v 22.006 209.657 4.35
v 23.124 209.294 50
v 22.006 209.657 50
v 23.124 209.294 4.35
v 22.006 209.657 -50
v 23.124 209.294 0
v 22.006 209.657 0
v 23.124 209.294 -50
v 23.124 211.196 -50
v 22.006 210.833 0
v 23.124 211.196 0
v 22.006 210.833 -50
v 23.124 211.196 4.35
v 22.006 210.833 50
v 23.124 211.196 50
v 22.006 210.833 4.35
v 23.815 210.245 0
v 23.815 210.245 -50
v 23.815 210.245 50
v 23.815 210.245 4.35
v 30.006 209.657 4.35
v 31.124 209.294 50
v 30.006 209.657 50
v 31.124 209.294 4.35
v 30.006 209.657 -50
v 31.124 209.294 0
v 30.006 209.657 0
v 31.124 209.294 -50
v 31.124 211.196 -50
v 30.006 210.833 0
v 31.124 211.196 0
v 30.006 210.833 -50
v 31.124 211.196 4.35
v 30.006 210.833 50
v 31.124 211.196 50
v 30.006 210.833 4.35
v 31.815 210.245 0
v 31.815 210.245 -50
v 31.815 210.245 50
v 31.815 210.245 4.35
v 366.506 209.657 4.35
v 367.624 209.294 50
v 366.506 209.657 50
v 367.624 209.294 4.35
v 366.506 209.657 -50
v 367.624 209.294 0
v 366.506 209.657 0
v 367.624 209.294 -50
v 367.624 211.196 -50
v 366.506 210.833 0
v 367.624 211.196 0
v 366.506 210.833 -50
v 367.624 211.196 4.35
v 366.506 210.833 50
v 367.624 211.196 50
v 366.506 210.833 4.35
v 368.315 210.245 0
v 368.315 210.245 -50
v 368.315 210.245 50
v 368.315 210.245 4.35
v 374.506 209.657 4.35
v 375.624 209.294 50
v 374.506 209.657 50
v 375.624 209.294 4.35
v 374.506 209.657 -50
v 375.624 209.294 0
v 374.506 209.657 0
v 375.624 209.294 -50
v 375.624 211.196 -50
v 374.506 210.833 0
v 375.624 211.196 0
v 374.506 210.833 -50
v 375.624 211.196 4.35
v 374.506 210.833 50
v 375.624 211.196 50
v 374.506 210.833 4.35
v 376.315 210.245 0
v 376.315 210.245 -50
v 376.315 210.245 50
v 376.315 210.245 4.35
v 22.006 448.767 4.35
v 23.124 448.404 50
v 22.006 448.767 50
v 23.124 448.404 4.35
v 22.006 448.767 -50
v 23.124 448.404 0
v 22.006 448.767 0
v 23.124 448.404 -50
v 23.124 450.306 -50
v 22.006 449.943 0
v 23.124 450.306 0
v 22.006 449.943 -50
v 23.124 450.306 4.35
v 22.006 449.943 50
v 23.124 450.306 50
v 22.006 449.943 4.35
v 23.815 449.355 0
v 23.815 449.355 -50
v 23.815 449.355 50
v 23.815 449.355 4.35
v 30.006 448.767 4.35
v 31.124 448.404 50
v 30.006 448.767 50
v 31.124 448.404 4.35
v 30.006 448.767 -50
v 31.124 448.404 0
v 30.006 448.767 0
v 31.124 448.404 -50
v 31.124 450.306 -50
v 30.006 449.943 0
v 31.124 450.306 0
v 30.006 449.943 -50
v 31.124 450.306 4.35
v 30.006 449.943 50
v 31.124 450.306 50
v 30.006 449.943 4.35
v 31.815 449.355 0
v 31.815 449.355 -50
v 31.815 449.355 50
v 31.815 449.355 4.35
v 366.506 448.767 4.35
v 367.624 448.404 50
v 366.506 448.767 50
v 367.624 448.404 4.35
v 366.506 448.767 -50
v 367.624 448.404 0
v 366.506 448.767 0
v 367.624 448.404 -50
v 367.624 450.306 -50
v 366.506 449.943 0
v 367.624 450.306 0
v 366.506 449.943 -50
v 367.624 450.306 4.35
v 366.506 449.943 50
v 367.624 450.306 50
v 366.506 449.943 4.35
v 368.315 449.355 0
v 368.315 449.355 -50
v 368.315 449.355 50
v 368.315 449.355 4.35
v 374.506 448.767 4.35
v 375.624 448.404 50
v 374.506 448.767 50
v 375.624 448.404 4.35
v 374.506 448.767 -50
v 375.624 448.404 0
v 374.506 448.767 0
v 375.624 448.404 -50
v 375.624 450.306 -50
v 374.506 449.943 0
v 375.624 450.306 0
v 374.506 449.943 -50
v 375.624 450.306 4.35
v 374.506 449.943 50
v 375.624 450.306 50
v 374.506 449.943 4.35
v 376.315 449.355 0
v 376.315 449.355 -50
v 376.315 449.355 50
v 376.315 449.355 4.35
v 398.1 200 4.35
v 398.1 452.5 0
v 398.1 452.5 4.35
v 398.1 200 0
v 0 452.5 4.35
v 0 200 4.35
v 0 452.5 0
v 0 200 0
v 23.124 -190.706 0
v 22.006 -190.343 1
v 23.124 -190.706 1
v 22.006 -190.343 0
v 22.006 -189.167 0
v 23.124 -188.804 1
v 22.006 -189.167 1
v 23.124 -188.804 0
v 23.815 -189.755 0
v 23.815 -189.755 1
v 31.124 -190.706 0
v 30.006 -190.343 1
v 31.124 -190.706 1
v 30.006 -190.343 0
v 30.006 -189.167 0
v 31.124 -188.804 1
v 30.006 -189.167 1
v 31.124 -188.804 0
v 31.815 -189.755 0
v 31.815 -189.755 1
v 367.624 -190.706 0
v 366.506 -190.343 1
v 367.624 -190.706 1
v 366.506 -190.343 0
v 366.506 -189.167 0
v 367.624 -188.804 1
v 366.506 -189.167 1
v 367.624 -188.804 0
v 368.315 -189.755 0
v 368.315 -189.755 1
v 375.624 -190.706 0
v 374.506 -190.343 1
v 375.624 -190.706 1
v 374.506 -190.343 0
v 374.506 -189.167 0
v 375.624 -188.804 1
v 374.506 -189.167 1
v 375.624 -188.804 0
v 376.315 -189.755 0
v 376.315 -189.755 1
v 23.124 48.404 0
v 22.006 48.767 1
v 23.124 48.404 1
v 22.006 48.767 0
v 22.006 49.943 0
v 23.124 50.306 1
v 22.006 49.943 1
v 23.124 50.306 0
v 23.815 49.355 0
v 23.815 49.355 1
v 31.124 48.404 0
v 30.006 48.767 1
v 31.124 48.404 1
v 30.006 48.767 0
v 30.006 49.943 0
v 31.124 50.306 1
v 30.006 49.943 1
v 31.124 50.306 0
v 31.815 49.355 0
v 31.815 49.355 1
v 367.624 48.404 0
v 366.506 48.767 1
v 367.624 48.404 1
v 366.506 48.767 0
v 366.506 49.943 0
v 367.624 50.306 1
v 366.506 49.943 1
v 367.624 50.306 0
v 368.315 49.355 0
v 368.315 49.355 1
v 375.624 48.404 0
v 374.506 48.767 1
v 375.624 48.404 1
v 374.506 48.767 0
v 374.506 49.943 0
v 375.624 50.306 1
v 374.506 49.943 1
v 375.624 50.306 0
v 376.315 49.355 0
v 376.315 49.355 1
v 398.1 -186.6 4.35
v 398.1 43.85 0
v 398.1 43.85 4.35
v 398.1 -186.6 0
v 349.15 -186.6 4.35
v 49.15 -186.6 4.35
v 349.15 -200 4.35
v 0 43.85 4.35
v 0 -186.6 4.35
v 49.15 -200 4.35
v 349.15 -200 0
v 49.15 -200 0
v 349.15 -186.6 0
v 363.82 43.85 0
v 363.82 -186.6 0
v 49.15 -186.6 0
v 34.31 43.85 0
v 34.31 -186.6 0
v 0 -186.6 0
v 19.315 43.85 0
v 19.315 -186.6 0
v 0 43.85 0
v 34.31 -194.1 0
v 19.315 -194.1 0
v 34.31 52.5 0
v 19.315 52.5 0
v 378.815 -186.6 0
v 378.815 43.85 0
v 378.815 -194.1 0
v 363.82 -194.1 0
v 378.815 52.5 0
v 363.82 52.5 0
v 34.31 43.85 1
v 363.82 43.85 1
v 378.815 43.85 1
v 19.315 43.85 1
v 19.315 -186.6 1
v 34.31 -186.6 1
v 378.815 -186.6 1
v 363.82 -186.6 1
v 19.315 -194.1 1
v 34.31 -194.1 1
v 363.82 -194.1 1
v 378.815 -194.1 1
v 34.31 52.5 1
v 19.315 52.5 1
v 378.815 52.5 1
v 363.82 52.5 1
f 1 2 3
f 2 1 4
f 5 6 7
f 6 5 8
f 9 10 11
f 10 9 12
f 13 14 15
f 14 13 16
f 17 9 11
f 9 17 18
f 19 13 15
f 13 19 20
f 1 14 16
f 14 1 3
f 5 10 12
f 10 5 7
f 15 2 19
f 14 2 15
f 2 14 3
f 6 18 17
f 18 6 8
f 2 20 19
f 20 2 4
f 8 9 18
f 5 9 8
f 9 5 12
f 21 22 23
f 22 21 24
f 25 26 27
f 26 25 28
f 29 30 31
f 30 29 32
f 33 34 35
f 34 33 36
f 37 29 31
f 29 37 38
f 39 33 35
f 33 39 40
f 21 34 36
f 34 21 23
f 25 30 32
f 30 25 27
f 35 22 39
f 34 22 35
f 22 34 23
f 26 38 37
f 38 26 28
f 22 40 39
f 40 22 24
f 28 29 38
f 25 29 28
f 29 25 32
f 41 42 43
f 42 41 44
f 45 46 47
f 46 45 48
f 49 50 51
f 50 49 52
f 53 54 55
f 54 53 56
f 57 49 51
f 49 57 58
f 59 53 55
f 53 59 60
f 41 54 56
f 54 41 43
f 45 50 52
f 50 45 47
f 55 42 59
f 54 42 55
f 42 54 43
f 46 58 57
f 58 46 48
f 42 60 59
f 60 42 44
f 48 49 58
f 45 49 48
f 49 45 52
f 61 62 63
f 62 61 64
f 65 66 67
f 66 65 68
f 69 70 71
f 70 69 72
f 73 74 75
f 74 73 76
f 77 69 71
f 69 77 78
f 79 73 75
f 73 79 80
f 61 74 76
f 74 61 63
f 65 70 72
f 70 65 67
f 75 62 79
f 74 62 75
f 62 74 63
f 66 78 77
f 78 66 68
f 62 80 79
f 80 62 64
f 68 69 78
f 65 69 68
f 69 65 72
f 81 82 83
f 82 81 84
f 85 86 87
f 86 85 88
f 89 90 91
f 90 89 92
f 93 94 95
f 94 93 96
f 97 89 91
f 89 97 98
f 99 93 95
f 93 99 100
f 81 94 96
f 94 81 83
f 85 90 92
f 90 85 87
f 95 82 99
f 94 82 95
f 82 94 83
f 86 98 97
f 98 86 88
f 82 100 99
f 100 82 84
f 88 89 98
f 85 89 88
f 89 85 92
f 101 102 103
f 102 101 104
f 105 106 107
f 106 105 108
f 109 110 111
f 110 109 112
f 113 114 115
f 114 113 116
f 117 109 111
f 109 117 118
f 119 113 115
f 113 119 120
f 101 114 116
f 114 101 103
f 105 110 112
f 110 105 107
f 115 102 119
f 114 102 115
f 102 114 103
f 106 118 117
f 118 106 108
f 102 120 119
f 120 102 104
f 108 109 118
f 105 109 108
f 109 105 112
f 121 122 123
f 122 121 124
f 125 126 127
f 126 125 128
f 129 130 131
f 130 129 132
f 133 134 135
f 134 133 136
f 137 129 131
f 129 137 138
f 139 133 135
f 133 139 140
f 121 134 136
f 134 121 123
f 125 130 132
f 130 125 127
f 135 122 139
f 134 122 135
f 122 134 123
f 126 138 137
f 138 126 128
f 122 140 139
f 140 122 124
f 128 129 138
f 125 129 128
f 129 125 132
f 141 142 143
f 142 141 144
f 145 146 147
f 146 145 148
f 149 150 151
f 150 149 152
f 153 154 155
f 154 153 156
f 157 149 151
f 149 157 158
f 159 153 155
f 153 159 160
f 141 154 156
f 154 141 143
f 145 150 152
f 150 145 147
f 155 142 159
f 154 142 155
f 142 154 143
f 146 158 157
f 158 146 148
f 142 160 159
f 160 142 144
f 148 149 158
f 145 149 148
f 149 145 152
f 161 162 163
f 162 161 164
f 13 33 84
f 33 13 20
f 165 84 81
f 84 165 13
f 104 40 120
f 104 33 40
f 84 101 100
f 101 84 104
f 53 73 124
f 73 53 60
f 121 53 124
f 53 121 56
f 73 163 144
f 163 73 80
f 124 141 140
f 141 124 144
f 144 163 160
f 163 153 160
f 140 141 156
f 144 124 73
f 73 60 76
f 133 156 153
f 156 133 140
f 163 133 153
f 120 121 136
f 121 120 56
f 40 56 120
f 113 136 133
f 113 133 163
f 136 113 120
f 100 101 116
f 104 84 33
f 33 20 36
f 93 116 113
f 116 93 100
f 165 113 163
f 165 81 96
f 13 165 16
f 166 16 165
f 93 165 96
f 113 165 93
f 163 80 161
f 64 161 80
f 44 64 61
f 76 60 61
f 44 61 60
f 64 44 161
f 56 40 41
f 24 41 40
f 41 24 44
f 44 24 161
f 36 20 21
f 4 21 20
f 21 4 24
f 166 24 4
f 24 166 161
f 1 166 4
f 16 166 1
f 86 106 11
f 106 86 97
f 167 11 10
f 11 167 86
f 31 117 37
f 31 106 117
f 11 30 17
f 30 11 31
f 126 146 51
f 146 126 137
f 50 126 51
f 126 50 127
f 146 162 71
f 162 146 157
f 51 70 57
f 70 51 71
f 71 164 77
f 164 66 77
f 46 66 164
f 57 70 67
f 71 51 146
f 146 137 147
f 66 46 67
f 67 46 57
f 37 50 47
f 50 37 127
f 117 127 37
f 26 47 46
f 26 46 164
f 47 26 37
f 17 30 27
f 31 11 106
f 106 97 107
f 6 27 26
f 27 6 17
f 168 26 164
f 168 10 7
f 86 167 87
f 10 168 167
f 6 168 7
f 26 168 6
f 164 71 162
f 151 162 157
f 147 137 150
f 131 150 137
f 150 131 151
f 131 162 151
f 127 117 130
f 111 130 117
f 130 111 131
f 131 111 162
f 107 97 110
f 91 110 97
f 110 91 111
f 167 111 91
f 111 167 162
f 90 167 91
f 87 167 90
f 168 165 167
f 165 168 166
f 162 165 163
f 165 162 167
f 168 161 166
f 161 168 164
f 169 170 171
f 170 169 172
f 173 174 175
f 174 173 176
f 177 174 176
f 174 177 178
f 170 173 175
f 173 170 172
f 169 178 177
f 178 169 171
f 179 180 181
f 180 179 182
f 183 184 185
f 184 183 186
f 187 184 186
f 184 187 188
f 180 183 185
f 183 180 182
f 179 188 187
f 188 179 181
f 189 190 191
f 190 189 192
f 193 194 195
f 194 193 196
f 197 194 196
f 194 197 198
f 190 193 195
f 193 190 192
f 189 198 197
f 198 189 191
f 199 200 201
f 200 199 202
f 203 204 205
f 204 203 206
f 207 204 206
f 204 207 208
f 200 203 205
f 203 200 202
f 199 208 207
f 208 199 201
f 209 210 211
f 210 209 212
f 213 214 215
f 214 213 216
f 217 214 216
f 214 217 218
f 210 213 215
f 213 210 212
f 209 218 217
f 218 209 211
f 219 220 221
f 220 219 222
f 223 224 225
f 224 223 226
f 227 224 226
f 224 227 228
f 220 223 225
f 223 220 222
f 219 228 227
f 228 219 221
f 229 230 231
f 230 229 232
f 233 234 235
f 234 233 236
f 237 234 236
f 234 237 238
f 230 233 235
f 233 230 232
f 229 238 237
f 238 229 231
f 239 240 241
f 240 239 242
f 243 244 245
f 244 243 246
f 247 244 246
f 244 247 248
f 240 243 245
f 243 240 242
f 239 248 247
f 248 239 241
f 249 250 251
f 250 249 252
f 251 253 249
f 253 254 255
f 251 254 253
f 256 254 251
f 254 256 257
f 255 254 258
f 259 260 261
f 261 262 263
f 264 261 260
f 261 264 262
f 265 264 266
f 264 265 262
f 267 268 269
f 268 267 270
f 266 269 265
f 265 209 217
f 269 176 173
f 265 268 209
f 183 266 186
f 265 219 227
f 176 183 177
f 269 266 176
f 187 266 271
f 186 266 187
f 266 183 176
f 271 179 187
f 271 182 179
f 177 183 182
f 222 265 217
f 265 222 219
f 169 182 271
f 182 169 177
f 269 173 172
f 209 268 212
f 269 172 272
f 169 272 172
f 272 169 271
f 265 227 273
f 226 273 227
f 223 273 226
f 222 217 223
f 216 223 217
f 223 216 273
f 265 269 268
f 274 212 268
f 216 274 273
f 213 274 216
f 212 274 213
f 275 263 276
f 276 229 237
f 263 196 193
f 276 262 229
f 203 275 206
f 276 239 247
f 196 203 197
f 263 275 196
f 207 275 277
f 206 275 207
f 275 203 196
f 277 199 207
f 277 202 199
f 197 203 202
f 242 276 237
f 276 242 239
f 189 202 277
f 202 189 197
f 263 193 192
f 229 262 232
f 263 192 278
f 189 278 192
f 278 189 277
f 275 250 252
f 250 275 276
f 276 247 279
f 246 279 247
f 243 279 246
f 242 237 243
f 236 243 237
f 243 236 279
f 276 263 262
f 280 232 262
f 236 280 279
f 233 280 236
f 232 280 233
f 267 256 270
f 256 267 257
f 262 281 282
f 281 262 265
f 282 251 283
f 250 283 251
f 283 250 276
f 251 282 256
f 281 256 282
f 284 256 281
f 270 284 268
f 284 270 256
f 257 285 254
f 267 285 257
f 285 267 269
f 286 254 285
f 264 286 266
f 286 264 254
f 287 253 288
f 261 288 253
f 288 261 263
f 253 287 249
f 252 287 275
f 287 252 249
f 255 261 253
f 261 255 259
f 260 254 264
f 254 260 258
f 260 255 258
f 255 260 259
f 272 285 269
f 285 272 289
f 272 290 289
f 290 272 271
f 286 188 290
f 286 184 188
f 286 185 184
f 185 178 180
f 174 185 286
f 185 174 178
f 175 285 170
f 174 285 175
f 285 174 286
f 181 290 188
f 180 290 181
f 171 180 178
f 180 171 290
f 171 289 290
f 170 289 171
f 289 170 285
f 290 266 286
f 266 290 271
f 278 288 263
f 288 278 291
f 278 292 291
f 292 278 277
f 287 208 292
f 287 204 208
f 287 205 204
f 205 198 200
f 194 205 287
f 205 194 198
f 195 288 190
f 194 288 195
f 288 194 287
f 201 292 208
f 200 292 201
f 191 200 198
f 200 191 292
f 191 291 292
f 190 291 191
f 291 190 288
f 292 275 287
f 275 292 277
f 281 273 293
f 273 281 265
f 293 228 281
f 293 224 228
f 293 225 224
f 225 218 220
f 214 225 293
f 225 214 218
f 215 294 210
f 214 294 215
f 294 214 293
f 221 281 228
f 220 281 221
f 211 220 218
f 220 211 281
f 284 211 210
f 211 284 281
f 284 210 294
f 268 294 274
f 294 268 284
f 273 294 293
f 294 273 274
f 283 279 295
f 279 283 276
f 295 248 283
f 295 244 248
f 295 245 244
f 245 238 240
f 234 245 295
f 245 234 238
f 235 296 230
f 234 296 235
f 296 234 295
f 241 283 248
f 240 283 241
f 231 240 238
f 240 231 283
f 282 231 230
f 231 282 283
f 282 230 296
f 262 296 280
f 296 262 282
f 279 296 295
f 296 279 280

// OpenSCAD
// file: pane.scad
B173QTN014_active_area_size=[382.08,214.92];//显示区域尺寸
B173QTN014_active_area_outline_size=[398.10,230.45];//屏幕主要部分的外圈尺寸
B173QTN014_outline_size=[B173QTN014_active_area_outline_size[0],252.5];//最外圈尺寸
B173QTN014_thickness=4.35;//屏幕厚度
B173QTN014_active_area_outline_margin_bottom=13.4;//面板下方有多少空间

module B173QTN014(cutout=false){
    module main_part(){
        size_bottom=B173QTN014_active_area_outline_margin_bottom;
        translate([0, size_bottom, 0])
        cube(concat(B173QTN014_active_area_outline_size,[B173QTN014_thickness]));
        translate([49.05+0.1, 0, 0])cube([300,size_bottom+0.1,B173QTN014_thickness]);
    }
    module screw_cutouts() {
        module screw_cutout() {
            cylinder(r=1, h=100, center=true);
            translate([8,0,0])cylinder(r=1, h=100, center=true);
        }
        diff=[344.5,239.11];
        loc=[22.815,13.4-(diff[1]-5.505-B173QTN014_active_area_outline_size[1])];
        translate(concat(loc,[0])){
            screw_cutout();
            translate([diff[0], 0, 0])screw_cutout();
            translate([0, diff[1], 0])screw_cutout();
            translate([diff[0], diff[1], 0])screw_cutout();
        }
    }
    module screw_boards() {
        h_top=8.65;//屏幕上方的螺丝板厚度
        h_down=7.5;//屏幕下方的螺丝板厚度
        w_left=49.05-19.315-14.74;//屏幕靠左的螺丝板宽度
        w_right=49.05-19.285-14.77;//屏幕靠右的螺丝板宽度
        loc_down=13.4;//屏幕下方的螺丝板上顶边纵坐标
        loc_top=loc_down+B173QTN014_active_area_outline_size[1];//屏幕上方的螺丝板下顶边纵坐标
        loc_left=19.315;//屏幕左侧的螺丝板左顶边横坐标
        loc_right=49.05+300+14.77;//屏幕右侧的螺丝板左顶边横坐标
        thickness=1;//厚度

        translate([0, 0, thickness]) {
            translate([loc_left, loc_down, 0])rotate([180, 0, 0])cube([w_left,h_down,thickness]);//左下角的螺丝板
            translate([loc_right, loc_down, 0])rotate([180, 0, 0])cube([w_right,h_down,thickness]);//右下角的螺丝板
        }
        translate([loc_left, loc_top, 0])cube([w_left,h_top,thickness]);//左上角的螺丝板
        translate([loc_right, loc_top, 0])cube([w_right,h_top,thickness]);//右上角的螺丝板
    }
    module _B173QTN014(){
        difference(){
            union(){
                main_part();
                screw_boards();
            }
            screw_cutouts();
        }
    }
    module CUTOUT(){
        cube(size=concat(B173QTN014_outline_size,[B173QTN014_thickness]));
        screw_cutouts();
    }
    if(cutout)CUTOUT();
    else _B173QTN014();
}
// main file
include <pane.scad>
translate([0, 200, 0])B173QTN014(true);
translate([0, -200, 0])B173QTN014(false);
